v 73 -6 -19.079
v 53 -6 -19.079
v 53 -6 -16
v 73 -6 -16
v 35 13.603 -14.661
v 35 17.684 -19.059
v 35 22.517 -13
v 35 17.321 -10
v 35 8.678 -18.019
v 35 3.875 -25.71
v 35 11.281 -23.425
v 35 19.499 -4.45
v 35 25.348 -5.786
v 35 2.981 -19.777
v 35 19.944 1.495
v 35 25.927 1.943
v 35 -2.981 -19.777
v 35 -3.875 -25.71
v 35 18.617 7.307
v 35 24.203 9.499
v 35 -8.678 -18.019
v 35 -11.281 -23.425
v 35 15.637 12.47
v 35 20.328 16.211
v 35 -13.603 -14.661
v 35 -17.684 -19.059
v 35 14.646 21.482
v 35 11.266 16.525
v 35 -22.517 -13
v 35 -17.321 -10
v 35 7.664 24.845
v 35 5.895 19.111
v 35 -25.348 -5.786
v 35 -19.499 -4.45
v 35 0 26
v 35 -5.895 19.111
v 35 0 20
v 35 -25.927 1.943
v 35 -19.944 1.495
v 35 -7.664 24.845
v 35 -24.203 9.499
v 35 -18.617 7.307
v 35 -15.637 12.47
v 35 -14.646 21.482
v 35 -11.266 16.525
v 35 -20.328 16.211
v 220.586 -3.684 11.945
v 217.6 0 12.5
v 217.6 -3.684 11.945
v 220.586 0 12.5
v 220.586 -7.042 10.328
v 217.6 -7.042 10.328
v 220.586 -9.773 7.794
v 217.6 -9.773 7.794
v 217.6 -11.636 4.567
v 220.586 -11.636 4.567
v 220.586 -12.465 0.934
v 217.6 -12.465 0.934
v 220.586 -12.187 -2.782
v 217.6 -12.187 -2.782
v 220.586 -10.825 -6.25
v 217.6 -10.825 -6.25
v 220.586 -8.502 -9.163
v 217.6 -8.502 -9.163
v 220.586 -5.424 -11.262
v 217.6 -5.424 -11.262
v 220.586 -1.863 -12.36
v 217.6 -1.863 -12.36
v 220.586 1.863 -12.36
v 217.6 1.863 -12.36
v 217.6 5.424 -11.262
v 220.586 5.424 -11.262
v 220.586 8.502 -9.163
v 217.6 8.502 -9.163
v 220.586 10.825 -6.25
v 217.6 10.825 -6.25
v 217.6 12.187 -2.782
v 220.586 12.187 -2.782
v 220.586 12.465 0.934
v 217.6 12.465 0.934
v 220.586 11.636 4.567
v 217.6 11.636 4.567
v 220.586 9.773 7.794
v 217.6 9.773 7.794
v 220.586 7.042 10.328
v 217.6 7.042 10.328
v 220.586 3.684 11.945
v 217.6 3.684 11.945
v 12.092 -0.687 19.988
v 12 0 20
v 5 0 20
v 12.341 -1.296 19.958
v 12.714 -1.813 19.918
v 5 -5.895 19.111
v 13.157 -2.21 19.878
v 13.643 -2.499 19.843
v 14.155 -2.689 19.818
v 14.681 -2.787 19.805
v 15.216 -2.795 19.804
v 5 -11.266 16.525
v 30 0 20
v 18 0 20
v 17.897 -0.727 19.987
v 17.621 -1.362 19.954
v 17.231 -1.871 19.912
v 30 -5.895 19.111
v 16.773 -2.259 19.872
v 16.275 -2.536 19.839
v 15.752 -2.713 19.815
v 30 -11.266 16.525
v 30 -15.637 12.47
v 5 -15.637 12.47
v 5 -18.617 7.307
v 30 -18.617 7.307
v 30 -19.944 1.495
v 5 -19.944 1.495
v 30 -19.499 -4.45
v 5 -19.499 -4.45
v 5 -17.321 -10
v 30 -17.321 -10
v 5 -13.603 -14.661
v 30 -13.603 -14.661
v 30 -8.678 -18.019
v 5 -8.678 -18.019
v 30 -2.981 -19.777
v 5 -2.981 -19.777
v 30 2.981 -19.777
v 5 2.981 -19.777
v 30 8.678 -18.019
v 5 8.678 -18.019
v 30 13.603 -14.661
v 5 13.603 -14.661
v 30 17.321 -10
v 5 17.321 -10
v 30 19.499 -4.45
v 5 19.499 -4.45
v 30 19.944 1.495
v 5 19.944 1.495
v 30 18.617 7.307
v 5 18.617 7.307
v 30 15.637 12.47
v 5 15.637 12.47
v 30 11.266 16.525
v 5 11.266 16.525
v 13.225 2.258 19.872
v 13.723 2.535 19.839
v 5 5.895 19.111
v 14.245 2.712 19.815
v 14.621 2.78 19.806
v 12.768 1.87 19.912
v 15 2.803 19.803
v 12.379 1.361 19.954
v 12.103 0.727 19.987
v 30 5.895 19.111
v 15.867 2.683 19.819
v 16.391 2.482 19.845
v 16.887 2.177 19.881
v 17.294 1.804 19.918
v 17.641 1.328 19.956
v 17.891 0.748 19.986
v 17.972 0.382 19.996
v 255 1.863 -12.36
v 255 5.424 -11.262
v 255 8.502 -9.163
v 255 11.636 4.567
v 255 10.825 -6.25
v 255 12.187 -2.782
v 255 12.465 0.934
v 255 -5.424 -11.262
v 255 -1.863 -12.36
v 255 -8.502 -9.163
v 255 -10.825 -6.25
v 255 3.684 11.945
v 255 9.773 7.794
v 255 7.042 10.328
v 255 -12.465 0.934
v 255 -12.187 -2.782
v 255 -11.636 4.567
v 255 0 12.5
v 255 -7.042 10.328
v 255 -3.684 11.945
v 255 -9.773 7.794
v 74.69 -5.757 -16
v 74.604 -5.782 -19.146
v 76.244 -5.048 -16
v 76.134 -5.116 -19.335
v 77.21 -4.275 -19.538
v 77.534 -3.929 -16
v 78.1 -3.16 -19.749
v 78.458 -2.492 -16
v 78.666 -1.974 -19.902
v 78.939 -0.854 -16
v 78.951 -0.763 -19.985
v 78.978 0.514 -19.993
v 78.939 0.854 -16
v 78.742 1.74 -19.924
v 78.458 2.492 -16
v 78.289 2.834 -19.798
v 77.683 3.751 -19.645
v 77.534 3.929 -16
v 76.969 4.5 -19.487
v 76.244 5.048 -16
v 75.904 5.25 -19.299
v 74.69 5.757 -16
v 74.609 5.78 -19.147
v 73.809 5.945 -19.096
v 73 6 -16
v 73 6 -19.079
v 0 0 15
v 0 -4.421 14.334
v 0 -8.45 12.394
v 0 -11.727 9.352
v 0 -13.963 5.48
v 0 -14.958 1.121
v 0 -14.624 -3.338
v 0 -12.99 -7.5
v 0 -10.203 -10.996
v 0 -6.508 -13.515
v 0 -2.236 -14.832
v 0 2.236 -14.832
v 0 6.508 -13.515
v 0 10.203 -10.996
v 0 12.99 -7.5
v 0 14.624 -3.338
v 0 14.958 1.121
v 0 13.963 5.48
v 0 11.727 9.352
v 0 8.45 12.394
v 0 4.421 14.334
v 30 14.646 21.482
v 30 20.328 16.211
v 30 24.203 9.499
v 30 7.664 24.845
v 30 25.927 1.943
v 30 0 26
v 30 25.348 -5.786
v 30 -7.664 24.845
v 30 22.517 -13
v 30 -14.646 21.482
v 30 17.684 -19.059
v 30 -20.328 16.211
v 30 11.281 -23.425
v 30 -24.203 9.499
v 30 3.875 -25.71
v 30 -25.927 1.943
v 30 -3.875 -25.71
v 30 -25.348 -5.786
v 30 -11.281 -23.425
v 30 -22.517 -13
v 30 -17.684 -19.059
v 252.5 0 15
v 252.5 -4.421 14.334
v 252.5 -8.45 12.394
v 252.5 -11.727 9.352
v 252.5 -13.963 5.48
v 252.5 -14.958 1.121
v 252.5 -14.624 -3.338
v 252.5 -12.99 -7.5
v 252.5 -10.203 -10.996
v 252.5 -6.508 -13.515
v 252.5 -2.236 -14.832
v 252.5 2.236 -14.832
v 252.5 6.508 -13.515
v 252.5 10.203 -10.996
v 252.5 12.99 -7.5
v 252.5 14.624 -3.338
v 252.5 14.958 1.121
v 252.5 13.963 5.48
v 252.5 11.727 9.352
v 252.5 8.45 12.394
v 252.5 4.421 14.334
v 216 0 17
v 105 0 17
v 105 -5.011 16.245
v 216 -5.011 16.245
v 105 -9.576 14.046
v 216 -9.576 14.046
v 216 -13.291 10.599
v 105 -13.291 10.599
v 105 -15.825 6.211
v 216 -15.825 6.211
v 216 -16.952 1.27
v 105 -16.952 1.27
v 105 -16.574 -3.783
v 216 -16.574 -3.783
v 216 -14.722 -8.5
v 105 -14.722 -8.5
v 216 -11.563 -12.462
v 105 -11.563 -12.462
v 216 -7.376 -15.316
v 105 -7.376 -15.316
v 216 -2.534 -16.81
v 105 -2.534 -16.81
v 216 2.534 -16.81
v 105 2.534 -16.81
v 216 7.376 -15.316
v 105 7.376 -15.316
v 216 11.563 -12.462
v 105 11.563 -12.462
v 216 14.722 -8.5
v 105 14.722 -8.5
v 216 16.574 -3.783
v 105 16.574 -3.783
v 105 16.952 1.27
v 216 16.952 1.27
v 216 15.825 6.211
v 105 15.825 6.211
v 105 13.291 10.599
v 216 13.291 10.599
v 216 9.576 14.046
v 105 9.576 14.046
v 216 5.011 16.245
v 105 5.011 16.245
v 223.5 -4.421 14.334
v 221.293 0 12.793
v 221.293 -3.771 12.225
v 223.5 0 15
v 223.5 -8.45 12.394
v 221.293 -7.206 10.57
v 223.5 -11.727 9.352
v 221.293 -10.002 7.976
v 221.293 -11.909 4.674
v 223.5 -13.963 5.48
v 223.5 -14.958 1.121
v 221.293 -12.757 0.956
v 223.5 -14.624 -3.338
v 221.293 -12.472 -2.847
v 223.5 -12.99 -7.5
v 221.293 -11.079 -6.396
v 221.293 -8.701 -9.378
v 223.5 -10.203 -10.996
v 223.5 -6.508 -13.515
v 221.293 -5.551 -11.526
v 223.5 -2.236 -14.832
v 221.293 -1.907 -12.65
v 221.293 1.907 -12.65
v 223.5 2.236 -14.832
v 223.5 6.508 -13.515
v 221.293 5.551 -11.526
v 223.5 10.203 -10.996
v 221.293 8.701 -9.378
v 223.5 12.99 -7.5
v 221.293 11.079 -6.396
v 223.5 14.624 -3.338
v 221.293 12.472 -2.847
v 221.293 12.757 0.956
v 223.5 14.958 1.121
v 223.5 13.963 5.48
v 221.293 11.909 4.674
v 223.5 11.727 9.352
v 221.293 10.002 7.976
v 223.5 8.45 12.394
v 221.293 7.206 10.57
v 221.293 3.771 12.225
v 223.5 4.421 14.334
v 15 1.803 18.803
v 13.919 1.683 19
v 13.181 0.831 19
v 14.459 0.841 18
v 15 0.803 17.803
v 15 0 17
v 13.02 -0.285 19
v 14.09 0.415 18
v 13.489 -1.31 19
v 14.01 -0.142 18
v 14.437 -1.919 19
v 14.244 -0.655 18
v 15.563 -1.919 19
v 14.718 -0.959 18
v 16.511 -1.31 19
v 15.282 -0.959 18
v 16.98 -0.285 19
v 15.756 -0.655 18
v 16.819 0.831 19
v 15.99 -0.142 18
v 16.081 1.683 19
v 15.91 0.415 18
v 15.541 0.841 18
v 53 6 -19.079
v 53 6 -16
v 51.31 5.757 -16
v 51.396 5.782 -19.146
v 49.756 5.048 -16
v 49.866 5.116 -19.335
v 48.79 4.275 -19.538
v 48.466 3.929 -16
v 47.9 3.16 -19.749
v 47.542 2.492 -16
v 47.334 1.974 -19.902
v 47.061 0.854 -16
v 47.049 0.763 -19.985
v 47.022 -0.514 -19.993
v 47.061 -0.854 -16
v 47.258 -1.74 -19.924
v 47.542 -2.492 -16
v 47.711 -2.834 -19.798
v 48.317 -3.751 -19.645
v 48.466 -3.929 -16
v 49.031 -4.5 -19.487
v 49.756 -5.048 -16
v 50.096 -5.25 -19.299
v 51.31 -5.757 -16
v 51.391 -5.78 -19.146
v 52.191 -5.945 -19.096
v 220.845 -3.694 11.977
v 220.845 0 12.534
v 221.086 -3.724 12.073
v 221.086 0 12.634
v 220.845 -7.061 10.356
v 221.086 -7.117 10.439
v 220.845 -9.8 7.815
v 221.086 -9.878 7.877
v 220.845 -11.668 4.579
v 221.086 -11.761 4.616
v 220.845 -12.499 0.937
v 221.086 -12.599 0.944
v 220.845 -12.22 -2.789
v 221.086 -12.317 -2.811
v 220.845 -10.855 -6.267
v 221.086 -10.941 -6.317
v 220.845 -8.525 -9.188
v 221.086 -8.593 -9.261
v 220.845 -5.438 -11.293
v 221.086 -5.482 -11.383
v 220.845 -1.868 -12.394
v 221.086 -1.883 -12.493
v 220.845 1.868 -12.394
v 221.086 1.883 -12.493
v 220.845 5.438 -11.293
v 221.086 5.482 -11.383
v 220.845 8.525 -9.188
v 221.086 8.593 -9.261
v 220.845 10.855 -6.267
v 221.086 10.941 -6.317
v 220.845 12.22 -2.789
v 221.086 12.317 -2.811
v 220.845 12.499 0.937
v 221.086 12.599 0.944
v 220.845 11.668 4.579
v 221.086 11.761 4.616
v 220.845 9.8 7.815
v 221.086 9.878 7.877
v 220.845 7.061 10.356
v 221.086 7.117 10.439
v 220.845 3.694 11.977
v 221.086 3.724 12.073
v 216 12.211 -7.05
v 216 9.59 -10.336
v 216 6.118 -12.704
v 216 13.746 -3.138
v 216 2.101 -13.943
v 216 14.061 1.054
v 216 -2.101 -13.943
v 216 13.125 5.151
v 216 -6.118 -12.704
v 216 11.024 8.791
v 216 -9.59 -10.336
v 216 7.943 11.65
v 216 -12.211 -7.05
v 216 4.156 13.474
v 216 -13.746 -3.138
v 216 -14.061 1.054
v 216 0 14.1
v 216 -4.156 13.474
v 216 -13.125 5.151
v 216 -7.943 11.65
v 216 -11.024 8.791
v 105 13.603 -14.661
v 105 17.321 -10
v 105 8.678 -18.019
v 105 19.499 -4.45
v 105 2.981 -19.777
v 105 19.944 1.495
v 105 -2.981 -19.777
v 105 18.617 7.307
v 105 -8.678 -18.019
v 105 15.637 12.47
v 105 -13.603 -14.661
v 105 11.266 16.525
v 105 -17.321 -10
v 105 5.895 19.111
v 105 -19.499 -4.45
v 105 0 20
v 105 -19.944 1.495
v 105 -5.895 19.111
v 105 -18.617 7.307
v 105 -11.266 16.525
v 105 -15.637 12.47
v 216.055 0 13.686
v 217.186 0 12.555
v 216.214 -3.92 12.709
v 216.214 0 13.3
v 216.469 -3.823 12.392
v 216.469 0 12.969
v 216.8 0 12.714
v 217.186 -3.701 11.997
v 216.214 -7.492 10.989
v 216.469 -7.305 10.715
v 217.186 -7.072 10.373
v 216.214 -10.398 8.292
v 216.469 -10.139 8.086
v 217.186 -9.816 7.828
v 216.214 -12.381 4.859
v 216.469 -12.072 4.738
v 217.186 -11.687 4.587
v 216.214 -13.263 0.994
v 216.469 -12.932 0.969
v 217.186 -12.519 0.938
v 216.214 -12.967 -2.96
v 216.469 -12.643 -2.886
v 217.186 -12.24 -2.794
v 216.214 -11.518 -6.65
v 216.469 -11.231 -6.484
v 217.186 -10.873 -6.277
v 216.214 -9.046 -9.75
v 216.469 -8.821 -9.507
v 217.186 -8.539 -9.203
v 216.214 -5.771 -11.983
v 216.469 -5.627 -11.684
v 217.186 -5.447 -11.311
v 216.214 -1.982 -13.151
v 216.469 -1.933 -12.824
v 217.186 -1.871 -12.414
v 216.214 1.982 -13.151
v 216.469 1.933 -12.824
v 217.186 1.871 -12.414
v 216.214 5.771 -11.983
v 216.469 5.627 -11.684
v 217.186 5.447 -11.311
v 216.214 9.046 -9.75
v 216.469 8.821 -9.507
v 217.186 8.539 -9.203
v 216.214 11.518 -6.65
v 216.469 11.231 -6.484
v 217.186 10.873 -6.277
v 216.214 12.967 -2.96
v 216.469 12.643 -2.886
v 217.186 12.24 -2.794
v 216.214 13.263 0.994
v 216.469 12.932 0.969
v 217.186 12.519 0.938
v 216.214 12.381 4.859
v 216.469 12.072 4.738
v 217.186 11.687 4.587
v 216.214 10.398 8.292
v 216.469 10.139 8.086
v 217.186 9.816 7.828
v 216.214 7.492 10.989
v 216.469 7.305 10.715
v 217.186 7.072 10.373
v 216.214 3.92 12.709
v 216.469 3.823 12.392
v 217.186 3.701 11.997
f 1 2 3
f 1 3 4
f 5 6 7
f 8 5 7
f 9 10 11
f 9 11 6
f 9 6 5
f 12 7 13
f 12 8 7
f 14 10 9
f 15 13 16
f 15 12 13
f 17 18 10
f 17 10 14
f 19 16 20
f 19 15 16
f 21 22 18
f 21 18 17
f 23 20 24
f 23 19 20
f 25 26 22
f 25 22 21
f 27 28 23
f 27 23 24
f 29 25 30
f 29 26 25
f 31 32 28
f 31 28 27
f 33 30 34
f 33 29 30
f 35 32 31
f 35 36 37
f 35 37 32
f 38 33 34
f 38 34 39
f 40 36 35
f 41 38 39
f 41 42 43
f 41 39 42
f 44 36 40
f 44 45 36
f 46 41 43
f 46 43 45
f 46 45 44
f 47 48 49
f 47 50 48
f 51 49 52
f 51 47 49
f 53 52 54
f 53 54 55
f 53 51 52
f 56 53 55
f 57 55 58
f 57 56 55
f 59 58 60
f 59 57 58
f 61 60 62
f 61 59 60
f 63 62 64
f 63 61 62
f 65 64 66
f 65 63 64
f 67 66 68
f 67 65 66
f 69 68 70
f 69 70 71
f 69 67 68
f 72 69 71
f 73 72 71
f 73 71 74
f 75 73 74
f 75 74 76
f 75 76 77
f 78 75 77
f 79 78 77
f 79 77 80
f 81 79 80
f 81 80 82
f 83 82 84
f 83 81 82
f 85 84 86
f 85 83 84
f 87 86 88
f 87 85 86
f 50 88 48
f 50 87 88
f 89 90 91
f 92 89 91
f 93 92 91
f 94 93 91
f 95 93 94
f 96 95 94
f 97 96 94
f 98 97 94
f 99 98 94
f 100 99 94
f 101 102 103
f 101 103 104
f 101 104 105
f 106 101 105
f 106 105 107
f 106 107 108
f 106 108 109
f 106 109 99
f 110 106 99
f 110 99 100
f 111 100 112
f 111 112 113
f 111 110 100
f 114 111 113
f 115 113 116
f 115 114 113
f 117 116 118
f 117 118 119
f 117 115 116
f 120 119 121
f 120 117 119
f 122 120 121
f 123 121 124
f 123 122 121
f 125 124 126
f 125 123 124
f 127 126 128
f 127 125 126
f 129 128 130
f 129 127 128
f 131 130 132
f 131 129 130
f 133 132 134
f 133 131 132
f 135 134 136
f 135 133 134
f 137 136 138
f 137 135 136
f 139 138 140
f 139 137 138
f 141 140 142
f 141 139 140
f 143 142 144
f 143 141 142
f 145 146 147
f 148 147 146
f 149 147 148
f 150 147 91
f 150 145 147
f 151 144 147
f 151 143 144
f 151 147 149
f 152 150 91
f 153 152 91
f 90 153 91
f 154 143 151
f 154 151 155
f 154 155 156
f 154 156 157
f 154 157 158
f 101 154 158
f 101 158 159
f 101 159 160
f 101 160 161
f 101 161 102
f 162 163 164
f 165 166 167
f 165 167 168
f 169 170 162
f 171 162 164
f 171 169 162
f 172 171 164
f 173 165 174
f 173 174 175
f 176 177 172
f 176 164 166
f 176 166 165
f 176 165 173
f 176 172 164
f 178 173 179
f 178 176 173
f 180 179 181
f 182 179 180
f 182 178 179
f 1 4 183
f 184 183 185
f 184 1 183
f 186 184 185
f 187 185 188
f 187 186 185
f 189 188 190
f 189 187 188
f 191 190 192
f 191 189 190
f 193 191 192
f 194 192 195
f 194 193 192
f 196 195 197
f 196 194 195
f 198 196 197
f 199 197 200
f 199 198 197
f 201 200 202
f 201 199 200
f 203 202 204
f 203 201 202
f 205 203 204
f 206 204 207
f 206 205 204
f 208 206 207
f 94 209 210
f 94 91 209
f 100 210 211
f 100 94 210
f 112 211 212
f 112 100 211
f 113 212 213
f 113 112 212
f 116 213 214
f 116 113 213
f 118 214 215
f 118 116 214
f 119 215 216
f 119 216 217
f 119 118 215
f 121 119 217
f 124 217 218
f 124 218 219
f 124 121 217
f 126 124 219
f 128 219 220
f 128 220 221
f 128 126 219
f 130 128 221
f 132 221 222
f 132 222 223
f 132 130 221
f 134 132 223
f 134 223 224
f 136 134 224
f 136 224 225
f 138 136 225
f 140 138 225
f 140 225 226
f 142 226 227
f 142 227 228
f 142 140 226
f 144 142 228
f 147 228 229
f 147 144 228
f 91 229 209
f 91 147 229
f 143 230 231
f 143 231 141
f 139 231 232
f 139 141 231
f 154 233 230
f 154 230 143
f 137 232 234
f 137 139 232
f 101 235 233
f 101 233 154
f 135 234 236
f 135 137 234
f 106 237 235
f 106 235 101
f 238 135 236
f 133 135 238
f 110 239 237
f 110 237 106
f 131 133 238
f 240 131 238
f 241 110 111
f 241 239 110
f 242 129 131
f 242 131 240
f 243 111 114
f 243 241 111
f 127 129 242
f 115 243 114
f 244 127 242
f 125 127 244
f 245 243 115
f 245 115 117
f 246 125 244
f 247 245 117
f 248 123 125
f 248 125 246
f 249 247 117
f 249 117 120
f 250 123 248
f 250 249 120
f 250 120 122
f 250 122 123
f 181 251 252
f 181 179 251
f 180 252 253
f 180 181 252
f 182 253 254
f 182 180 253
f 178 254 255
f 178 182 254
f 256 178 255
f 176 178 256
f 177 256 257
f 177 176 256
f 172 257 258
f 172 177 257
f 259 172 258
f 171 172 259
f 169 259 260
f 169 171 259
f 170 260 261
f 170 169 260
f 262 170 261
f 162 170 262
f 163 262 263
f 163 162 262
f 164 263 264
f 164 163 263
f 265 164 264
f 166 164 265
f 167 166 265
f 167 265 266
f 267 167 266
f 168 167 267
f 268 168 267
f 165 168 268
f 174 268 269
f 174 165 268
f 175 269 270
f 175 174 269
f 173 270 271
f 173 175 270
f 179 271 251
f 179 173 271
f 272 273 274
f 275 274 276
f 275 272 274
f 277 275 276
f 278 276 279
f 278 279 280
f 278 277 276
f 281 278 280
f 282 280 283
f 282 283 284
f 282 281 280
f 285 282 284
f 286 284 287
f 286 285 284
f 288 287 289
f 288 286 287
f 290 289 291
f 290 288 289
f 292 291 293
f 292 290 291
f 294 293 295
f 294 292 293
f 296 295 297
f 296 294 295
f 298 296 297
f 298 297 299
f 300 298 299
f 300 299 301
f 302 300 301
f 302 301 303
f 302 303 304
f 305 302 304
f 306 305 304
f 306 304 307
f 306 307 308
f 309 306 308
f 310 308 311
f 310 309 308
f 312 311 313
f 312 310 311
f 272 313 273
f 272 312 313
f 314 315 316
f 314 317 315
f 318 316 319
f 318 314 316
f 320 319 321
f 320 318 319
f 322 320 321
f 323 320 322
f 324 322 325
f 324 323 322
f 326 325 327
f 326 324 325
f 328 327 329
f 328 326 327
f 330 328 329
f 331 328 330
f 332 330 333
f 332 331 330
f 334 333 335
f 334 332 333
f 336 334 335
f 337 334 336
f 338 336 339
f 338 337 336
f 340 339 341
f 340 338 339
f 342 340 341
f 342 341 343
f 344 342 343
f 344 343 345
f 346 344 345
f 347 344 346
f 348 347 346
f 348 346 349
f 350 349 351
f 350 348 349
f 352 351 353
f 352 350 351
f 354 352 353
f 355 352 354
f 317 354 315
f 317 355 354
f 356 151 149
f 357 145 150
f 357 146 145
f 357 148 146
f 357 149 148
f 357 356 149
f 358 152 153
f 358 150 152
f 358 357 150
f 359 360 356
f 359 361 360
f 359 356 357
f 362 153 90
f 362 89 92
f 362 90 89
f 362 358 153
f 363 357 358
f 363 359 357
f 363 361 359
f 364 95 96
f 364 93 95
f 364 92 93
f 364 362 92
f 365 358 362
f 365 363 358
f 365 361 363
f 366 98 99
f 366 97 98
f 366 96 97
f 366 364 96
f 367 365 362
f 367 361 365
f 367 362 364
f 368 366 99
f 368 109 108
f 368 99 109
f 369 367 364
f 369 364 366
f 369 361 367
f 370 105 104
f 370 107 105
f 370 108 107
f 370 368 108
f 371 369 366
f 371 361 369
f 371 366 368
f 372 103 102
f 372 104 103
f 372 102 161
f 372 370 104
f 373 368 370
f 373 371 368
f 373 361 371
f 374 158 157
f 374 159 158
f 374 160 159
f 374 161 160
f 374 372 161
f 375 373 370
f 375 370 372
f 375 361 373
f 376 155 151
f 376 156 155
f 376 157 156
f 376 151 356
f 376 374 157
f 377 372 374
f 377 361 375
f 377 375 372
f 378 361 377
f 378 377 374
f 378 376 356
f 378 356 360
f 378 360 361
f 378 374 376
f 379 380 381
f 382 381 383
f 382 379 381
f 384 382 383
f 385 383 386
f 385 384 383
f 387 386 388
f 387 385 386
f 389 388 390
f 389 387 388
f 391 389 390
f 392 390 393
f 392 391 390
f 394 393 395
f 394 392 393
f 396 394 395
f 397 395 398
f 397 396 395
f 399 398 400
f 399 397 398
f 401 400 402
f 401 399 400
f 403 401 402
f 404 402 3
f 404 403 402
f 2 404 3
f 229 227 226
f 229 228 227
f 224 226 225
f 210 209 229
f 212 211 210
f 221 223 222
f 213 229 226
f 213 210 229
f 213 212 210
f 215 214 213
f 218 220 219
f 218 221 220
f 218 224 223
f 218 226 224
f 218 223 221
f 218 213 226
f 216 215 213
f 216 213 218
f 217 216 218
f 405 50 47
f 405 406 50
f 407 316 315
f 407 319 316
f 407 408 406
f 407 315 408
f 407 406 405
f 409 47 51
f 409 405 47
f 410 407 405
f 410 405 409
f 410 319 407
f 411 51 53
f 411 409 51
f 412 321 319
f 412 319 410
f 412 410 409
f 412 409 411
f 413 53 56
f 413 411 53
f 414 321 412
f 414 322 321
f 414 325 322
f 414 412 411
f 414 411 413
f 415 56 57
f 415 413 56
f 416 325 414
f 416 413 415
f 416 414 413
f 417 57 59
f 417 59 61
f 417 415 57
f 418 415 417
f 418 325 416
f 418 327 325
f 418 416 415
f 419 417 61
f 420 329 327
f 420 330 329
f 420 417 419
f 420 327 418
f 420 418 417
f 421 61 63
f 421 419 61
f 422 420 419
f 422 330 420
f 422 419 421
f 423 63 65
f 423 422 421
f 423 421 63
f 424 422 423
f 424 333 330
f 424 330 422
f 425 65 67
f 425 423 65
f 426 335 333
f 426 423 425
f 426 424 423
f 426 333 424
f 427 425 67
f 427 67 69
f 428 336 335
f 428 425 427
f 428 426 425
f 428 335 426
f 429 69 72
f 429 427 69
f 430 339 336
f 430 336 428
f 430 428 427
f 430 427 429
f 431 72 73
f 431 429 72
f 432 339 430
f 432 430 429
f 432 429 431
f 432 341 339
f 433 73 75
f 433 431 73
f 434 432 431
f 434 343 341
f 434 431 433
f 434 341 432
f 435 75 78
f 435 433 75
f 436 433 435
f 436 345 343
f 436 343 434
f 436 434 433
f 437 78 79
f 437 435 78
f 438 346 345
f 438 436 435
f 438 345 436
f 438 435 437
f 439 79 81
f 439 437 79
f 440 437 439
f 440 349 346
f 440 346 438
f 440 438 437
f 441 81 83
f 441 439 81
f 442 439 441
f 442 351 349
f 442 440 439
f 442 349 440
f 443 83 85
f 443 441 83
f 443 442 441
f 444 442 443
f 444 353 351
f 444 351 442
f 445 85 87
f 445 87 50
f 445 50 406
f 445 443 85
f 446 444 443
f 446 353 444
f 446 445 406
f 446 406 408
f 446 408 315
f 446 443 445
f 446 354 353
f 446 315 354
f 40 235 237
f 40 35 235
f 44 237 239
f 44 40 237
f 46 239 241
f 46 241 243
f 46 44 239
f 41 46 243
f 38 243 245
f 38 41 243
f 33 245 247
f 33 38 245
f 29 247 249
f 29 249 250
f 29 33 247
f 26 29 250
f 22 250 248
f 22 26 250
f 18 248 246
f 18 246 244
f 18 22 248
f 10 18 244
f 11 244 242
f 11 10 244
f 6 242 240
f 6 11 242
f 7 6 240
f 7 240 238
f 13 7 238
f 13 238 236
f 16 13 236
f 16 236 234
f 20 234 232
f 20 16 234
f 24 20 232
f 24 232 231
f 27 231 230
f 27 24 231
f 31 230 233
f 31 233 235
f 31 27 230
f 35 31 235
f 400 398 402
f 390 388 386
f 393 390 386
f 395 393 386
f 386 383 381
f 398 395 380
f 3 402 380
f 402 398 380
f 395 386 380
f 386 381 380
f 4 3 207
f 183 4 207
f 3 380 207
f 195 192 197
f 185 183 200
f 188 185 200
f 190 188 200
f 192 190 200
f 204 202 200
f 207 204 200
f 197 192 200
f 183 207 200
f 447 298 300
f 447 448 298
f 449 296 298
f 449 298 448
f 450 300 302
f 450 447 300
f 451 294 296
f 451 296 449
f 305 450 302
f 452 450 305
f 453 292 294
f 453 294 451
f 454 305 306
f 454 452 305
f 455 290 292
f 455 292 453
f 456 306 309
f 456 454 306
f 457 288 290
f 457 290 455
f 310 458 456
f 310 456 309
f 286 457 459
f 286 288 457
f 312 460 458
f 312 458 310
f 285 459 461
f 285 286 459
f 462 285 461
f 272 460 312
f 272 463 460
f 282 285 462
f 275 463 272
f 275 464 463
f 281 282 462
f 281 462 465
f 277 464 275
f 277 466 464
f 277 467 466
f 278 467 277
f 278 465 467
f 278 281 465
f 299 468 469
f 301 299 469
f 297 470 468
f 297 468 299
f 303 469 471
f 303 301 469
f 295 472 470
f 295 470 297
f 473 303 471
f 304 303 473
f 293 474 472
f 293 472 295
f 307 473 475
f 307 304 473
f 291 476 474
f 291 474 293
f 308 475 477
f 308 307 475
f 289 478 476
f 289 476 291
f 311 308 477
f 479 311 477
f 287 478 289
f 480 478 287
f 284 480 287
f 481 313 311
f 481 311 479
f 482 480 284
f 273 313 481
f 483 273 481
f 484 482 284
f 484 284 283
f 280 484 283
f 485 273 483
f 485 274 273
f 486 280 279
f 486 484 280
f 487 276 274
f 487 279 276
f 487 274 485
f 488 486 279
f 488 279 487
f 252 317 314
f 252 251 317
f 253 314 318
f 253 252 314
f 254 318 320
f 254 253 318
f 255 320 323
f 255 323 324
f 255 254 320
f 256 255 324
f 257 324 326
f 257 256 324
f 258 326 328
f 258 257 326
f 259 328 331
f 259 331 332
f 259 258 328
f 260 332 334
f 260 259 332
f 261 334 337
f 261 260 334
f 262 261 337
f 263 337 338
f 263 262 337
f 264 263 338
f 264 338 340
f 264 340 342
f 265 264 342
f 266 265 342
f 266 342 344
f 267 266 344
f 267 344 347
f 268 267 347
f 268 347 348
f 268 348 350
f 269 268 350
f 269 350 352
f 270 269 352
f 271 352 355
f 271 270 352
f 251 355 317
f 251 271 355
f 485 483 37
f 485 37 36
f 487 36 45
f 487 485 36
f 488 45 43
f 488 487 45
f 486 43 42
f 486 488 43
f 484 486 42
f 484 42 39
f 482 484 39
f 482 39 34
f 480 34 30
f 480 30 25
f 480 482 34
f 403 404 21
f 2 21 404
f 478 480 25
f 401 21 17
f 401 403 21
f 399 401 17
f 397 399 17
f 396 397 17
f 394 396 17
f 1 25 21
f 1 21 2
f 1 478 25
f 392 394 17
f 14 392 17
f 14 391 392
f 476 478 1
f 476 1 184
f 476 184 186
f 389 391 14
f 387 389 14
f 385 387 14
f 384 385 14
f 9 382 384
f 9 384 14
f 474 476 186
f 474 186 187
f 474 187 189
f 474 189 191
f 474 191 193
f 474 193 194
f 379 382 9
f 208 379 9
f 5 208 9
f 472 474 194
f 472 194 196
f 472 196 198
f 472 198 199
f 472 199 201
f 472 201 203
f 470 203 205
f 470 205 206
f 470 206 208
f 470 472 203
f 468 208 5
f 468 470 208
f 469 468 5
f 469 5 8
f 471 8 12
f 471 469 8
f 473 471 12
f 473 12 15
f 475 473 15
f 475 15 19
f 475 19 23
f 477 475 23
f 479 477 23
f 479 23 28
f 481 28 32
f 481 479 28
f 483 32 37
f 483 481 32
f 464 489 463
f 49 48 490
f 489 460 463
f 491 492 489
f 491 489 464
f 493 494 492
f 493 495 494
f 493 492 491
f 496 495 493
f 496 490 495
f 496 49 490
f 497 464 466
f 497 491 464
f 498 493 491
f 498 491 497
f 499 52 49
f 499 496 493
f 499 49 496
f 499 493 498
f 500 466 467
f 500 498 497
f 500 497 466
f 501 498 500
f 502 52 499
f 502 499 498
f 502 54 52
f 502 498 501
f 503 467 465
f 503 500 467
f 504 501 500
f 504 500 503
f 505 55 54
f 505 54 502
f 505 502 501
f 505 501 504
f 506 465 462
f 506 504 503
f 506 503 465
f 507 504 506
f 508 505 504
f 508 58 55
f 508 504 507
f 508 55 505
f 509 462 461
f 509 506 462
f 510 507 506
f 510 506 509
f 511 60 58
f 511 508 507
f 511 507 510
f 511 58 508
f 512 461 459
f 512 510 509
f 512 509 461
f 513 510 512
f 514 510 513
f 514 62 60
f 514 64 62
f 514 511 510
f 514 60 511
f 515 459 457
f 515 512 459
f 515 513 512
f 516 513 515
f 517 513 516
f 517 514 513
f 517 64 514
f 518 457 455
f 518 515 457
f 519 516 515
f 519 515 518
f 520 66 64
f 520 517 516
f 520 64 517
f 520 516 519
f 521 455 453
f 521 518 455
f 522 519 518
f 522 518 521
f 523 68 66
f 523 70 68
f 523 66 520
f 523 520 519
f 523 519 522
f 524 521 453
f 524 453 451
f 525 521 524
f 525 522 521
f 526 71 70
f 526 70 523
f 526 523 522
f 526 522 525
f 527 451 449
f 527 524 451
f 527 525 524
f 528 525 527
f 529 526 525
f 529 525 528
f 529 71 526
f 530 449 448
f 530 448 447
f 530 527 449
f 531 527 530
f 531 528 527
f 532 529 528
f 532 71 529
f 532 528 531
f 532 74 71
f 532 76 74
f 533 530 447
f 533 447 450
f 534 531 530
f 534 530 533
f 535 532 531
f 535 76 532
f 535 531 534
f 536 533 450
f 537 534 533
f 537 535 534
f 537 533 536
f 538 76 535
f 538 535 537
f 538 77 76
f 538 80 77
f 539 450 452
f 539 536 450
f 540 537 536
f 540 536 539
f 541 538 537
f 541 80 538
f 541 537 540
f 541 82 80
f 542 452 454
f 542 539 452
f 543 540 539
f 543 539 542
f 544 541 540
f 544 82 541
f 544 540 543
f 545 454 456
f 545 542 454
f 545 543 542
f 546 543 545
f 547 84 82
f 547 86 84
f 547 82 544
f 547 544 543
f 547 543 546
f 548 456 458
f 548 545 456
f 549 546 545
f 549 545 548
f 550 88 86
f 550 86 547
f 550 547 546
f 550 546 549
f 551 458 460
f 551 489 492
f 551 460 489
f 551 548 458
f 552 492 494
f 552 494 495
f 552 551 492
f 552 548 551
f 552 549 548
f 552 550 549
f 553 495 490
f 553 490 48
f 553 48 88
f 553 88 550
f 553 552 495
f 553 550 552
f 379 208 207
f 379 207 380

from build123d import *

# Parameters (mm, degrees)
CUT_EXTRUDE1_DEPTH = 4


with BuildPart() as part:
    # Sketch1 → Revolve1 (revolve)
    with BuildSketch(Plane(origin=(0, 0, 0), x_dir=(1, 0, 0), z_dir=(0, 1, 0))):
        with BuildLine():
            Line((0, 0), (0, -15))
            Line((0, -15), (5, -20))
            Line((5, -20), (30, -20))
            Line((30, -20), (30, -26))
            Line((30, -26), (35, -26))
            Line((35, -26), (35, -20))
            Line((35, -20), (105, -20))
            Line((105, -20), (105, -17))
            Line((105, -17), (216, -17))
            Line((216, -17), (216, -15))
            Line((216, -15), (216, -14.1))
            ThreePointArc((216, -14.1), (216.46862915, -12.96862915), (217.6, -12.5))
            Line((217.6, -12.5), (220.585786438, -12.5))
            ThreePointArc((220.585786438, -12.5), (220.96846987, -12.576120467), (221.292893219, -12.792893219))
            Line((221.292893219, -12.792893219), (223.5, -15))
            Line((223.5, -15), (252.5, -15))
            Line((252.5, -15), (255, -12.5))
            Line((255, -12.5), (255, 0))
            Line((255, 0), (0, 0))
        make_face()
    revolve(axis=Axis((-87.77690163, 0, 0), (1, 0, 0)))

    # Sketch5 → Cut-Revolve1 (revolve, cut)
    with BuildSketch(Plane.ZY.offset(-15)):
        Polygon((20, 0), (20, 3), (17, 0), align=None)
    revolve(axis=Axis((15, 0, 17), (0, 0, 1)), mode=Mode.SUBTRACT)

    # Sketch6 → Cut-Extrude1 (cut)
    with BuildSketch(Plane(origin=(0, 0, -20), x_dir=(-1, 0, 0), z_dir=(0, 0, -1))):
        with BuildLine():
            Line((-73, 6), (-53, 6))
            ThreePointArc((-53, 6), (-47, 0), (-53, -6))
            Line((-53, -6), (-73, -6))
            ThreePointArc((-73, -6), (-79, 0), (-73, 6))
        make_face()
    extrude(amount=-CUT_EXTRUDE1_DEPTH, mode=Mode.SUBTRACT)


solid = part.part
